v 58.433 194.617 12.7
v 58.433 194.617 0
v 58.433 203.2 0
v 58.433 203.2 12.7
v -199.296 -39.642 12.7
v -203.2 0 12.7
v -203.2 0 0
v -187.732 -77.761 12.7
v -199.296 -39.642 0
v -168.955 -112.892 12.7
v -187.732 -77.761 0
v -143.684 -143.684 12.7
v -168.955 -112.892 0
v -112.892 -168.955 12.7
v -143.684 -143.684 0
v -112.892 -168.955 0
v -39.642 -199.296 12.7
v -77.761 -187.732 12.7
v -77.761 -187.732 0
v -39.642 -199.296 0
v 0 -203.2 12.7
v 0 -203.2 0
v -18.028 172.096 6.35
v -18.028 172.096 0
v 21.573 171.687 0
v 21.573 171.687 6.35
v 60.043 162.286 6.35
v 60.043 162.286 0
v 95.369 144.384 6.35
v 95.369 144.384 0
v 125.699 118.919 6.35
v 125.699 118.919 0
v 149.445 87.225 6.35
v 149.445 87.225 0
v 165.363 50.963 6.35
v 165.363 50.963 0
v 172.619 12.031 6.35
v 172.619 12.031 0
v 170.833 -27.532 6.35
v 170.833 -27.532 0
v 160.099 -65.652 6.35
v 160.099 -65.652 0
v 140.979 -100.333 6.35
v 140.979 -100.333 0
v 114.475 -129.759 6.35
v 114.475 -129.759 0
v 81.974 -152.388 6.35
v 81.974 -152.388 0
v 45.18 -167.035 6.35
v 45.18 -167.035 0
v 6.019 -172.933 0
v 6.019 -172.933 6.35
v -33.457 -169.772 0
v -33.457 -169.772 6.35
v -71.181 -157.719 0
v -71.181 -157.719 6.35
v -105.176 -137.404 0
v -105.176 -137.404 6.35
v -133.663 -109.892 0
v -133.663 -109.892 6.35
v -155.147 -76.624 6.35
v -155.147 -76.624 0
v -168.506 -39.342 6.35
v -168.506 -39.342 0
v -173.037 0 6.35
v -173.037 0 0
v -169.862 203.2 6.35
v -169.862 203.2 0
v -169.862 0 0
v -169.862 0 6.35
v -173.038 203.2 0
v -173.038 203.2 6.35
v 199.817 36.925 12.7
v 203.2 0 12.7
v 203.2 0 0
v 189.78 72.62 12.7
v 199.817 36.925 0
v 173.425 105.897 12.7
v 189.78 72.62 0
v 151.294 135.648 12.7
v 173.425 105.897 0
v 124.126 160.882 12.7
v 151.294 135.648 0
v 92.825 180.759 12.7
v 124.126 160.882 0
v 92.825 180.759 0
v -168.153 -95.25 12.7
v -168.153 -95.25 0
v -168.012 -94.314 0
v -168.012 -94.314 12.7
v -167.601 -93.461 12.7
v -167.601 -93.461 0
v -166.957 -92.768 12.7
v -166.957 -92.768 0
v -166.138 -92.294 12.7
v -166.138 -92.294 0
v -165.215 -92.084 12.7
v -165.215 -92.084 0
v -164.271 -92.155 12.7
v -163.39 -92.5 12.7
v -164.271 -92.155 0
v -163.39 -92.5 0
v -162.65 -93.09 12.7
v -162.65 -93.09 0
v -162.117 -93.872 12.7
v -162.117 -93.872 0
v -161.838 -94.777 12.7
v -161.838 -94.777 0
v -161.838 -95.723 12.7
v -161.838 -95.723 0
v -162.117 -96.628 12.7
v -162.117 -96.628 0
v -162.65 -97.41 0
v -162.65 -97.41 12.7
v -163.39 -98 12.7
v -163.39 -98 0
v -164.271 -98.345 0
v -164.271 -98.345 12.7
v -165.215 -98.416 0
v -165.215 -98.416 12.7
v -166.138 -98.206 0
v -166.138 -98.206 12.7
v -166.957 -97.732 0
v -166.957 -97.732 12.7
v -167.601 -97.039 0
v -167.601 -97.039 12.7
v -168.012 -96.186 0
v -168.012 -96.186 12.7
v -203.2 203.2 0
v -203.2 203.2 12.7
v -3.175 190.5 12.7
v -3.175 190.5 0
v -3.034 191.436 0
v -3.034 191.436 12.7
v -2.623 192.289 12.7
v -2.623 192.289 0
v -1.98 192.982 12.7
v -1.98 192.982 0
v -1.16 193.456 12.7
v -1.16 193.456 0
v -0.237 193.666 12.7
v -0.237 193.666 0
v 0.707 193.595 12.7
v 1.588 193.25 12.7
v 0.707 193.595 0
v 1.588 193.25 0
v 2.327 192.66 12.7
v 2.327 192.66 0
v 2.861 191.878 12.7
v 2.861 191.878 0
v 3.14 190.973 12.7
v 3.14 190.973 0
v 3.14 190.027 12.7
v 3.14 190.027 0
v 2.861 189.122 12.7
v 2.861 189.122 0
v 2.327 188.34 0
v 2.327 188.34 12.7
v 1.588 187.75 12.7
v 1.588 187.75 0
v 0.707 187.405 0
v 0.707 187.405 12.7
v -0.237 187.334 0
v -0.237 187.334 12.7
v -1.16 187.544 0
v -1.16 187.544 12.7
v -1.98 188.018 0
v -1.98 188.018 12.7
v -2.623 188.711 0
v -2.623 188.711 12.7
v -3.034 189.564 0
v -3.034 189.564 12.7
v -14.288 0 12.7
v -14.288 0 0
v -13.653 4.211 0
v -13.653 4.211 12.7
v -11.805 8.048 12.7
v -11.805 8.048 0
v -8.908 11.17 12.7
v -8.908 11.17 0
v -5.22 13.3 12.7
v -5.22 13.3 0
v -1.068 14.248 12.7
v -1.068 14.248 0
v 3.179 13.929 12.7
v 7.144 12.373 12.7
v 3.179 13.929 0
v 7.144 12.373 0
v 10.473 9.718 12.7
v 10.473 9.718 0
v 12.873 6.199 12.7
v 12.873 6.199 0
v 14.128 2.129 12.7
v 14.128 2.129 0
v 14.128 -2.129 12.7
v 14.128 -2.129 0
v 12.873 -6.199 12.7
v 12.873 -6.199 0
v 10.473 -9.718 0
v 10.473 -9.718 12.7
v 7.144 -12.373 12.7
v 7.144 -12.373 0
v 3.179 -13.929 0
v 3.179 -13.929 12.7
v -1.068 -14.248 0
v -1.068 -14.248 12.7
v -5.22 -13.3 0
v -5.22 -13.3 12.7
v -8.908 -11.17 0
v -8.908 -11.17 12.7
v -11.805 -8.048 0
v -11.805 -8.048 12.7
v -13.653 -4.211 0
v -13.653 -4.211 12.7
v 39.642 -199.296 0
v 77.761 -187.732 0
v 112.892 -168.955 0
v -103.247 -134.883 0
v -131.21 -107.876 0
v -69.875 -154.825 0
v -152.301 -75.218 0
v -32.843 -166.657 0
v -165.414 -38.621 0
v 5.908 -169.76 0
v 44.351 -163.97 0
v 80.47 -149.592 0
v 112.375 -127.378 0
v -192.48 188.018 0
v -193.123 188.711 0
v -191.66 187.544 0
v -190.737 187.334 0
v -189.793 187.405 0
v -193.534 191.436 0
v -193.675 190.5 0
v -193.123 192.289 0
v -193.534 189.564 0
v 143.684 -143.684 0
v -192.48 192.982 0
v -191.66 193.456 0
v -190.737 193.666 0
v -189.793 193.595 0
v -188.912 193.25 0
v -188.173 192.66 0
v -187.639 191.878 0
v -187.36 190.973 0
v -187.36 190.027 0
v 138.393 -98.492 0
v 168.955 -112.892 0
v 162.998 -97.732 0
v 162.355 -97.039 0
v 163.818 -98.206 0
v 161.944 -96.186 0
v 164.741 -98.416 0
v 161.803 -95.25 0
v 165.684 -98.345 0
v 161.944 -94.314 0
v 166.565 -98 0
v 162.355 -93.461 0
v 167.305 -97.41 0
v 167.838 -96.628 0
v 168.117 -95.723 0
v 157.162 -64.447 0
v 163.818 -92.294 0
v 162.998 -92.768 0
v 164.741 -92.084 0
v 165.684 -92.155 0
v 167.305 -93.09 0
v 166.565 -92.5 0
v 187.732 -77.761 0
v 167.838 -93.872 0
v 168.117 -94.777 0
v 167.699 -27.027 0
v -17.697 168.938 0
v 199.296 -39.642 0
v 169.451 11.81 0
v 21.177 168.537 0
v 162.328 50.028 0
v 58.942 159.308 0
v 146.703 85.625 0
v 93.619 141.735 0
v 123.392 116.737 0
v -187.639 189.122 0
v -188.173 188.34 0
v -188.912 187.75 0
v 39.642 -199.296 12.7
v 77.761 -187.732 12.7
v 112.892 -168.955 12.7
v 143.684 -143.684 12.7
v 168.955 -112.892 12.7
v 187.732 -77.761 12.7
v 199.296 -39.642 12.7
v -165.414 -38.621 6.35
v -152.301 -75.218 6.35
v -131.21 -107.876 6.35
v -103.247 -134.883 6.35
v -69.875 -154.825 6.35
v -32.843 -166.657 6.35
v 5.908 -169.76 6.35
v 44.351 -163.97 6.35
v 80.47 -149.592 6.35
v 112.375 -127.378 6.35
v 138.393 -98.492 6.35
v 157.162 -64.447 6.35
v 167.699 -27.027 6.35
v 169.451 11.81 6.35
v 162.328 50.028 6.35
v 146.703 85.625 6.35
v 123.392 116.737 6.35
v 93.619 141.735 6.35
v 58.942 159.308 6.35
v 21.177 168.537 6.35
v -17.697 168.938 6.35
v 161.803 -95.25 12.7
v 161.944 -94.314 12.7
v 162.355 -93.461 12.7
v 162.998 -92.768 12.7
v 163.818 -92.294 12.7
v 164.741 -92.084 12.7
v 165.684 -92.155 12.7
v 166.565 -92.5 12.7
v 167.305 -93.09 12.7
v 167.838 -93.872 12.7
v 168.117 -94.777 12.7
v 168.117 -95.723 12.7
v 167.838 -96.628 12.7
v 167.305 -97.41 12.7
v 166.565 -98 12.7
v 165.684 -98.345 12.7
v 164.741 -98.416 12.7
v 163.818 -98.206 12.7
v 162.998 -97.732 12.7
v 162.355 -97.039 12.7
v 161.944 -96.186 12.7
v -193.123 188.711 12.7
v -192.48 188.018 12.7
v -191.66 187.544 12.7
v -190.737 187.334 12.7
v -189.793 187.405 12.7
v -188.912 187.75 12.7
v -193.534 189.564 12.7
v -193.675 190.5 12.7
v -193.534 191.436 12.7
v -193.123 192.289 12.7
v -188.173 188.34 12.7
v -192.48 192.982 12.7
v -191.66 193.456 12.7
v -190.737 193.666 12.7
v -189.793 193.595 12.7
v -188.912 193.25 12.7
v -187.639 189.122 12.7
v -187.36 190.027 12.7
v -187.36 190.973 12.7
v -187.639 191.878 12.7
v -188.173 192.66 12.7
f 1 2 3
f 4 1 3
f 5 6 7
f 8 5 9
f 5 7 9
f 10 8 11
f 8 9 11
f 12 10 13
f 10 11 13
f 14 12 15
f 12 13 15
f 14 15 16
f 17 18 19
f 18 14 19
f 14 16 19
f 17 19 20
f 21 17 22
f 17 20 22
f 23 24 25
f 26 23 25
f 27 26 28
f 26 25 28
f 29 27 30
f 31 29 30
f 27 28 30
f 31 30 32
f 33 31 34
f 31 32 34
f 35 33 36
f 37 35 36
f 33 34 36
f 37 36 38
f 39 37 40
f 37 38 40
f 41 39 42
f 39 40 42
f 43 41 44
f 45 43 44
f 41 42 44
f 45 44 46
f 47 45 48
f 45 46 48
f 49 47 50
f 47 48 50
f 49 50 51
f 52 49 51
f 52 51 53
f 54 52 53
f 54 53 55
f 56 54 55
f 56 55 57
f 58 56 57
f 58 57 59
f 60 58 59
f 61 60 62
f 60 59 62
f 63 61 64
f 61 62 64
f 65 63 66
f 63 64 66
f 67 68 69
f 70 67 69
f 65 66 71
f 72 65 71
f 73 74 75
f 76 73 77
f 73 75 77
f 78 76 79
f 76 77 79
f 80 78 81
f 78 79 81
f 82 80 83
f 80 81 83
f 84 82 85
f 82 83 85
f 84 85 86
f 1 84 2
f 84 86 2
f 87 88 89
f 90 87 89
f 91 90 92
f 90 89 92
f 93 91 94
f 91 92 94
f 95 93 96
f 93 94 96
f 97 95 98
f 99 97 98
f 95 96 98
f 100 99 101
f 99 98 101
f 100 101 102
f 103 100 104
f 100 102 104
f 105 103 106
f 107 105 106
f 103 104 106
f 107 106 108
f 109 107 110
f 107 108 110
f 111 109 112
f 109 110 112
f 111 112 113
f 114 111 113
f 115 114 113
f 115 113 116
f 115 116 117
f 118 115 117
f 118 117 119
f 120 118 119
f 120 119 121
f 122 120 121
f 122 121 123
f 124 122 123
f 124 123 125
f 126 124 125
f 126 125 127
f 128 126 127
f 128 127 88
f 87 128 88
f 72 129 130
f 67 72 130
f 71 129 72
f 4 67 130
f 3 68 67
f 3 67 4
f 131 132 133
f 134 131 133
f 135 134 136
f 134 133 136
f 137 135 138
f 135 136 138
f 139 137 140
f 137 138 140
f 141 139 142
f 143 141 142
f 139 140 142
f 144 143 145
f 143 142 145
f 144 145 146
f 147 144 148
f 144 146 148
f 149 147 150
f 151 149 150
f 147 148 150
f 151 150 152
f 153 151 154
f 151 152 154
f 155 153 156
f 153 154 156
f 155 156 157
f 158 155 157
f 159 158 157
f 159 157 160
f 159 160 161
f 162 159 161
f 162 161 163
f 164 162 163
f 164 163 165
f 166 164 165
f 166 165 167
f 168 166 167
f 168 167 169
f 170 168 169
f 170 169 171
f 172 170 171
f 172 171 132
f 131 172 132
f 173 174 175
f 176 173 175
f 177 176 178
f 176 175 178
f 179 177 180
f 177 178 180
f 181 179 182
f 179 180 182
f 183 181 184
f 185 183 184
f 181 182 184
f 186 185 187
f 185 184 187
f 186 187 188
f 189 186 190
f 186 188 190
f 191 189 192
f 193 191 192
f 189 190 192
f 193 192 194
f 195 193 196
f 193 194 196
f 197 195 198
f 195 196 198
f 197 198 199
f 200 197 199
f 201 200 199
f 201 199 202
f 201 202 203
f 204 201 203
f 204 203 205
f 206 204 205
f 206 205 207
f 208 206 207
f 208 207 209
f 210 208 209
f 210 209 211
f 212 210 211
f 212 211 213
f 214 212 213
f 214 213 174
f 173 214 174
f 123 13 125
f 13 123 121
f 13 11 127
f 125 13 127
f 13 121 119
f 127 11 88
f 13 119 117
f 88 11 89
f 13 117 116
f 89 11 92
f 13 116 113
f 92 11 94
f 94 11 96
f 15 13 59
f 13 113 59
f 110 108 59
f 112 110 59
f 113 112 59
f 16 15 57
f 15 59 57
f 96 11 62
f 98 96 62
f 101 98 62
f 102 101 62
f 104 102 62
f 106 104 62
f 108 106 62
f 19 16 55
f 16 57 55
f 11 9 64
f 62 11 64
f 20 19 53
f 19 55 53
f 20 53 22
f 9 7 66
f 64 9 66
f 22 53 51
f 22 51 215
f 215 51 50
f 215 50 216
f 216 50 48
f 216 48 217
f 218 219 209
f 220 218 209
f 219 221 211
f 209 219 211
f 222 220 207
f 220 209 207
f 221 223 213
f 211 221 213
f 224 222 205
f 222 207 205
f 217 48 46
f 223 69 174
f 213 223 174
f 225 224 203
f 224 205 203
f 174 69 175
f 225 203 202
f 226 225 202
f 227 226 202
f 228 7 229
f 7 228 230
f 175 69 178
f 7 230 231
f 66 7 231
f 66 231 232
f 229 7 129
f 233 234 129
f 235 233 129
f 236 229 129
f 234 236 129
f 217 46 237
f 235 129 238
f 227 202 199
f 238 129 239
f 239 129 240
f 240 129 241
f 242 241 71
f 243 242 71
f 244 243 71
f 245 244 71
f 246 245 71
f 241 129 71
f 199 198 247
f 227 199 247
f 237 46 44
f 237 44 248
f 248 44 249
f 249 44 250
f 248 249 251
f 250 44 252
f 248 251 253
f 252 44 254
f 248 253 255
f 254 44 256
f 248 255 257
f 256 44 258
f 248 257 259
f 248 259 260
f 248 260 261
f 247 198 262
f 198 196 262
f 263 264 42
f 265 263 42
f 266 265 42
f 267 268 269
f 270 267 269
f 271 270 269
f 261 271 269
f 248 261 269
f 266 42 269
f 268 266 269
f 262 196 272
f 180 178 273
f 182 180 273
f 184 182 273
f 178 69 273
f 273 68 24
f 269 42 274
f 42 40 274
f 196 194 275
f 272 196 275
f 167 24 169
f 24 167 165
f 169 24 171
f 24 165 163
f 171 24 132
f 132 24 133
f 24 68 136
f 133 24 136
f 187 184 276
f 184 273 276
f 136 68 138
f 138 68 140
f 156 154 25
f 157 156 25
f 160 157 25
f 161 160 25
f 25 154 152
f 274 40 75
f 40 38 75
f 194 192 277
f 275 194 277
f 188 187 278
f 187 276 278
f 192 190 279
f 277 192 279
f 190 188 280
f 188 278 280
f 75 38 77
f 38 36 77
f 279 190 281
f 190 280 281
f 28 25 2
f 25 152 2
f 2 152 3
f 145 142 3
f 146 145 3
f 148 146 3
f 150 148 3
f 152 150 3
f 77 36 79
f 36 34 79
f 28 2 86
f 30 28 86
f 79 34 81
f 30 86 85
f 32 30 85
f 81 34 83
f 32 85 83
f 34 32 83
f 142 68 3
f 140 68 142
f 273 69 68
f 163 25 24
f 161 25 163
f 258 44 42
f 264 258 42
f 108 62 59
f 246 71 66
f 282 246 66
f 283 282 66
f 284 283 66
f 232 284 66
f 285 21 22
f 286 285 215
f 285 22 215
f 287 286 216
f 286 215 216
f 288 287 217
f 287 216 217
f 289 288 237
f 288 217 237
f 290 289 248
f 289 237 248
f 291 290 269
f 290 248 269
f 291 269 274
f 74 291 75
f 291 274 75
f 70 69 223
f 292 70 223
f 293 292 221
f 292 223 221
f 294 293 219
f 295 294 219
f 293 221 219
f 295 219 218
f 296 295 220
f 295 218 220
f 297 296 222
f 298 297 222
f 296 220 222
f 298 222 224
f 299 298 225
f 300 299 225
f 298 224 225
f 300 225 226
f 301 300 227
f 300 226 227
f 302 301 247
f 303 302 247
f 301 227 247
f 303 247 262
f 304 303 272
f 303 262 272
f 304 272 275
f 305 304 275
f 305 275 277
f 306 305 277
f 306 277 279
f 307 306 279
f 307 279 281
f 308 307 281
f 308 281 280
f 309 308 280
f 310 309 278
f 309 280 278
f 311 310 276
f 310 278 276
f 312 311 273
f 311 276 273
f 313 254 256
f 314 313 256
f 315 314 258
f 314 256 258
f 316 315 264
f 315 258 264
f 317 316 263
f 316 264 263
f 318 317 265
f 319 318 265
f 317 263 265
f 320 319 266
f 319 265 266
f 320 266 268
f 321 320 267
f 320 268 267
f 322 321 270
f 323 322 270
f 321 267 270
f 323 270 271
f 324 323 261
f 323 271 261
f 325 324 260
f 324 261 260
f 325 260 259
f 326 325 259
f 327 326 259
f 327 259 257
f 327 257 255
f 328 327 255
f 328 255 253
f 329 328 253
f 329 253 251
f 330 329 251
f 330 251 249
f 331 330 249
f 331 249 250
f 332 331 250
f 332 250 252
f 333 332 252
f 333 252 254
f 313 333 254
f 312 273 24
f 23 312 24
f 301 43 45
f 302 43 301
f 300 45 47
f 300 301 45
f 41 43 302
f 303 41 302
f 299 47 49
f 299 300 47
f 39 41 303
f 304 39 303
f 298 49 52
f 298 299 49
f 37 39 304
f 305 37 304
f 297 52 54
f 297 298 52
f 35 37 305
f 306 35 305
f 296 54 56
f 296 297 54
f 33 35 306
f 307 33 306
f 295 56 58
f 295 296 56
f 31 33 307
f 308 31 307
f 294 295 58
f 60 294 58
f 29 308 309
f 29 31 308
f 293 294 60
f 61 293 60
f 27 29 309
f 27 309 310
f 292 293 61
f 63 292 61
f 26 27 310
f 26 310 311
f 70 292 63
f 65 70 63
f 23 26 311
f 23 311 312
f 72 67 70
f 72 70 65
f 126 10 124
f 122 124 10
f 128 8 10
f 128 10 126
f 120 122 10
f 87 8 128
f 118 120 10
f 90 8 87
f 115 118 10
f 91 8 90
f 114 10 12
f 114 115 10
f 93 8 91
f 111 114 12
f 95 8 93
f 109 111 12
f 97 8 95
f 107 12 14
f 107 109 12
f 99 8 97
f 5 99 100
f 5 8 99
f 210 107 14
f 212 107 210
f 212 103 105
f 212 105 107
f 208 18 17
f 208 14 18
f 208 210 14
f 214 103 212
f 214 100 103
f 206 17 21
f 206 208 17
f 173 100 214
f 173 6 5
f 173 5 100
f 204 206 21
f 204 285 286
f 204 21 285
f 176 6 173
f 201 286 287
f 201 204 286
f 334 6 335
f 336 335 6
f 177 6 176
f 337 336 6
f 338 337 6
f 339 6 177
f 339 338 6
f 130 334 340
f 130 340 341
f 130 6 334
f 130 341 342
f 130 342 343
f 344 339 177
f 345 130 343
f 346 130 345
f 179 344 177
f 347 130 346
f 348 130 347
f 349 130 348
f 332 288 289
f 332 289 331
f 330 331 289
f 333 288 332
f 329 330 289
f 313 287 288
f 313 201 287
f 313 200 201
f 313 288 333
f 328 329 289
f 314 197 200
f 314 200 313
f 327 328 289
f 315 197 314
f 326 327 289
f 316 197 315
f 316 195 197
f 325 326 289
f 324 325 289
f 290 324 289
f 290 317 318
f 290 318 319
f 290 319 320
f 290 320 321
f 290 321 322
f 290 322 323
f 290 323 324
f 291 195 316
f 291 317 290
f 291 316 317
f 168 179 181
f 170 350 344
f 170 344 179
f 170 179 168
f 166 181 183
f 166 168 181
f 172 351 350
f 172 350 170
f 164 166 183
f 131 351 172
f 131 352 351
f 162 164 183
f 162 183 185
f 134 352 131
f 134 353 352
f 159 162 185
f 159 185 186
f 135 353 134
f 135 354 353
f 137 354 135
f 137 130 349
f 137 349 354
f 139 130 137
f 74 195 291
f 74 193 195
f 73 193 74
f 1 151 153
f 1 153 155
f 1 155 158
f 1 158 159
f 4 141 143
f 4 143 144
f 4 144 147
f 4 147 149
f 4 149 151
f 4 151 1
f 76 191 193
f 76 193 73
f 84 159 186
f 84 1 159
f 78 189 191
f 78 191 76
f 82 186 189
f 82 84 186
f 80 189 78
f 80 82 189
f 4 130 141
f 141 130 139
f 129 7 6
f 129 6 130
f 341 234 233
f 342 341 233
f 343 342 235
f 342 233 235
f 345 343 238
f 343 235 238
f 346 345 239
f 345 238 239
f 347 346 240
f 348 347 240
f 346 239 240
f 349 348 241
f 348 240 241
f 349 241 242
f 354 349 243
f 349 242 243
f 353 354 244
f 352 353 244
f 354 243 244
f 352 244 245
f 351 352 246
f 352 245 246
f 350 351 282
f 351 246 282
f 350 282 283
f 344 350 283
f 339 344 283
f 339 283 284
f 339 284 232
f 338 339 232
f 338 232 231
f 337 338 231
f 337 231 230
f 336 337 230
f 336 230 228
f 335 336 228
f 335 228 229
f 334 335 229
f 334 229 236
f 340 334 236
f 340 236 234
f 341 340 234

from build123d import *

# Parameters (mm, degrees)
SKETCH1_W           = 406.4
SKETCH1_H           = 406.4
BOSS_EXTRUDE1_DEPTH = 12.7
CUT_EXTRUDE1_DEPTH  = 6.35
SKETCH3_R           = 14.2875
CUT_EXTRUDE2_DEPTH  = 13.7
SKETCH4_R           = 3.175
CUT_EXTRUDE3_DEPTH  = 13.7


with BuildPart() as part:
    # Sketch1 → Boss-Extrude1 (new body)
    with BuildSketch(Plane.XY):
        Rectangle(SKETCH1_W, SKETCH1_H)
    extrude(amount=BOSS_EXTRUDE1_DEPTH)

    # Sketch2 → Cut-Extrude1 (cut)
    with BuildSketch(Plane(origin=(0, 0, 0), x_dir=(-1, 0, 0), z_dir=(0, 0, -1))):
        with BuildLine():
            Line((17.696900373, 168.938120694), (18.027683557, 172.095842576))
            ThreePointArc((18.027683557, 172.095842576), (-128.571850923, -115.806975422), (173.0375, 0))
            Line((173.0375, 0), (173.0375, 203.2))
            Line((173.0375, 203.2), (169.8625, 203.2))
            Line((169.8625, 203.2), (169.8625, 0))
            ThreePointArc((169.8625, 0), (-126.212734393, -113.68207679), (17.696900373, 168.938120694))
        make_face()
    extrude(amount=-CUT_EXTRUDE1_DEPTH, mode=Mode.SUBTRACT)

    # Sketch3 → Cut-Extrude2 (cut, through all)
    with BuildSketch(Plane(origin=(0, 0, 0), x_dir=(-1, 0, 0), z_dir=(0, 0, -1))):
        with BuildLine():
            ThreePointArc((203.2, 0), (143.684097941, -143.684097933), (1.1e-08, -203.2))
            Line((1.1e-08, -203.2), (203.2, -203.2))
            Line((203.2, -203.2), (203.2, 0))
        make_face()
        with BuildLine():
            ThreePointArc((1.1e-08, -203.2), (-143.684098268, -143.684097606), (-203.2, 9.47e-07))
            Line((-203.2, 9.47e-07), (-203.2, -203.2))
            Line((-203.2, -203.2), (1.1e-08, -203.2))
        make_face()
        with BuildLine():
            ThreePointArc((-203.2, 9.47e-07), (-163.039512773, 121.278016454), (-58.432704894, 194.617211466))
            Line((-58.432704894, 194.617211466), (-58.432704894, 203.2))
            Line((-58.432704894, 203.2), (-203.2, 203.2))
            Line((-203.2, 203.2), (-203.2, 9.47e-07))
        make_face()
        Circle(SKETCH3_R)
    extrude(amount=-CUT_EXTRUDE2_DEPTH, mode=Mode.SUBTRACT)

    # Sketch4 → Cut-Extrude3 (cut, through all)
    with BuildSketch(Plane(origin=(0, 0, 0), x_dir=(-1, 0, 0), z_dir=(0, 0, -1))):
        with Locations((-164.977839421, -95.25)):
            Circle(SKETCH4_R)
        with Locations((0, 190.5)):
            Circle(SKETCH4_R)
        with Locations((164.977839421, -95.25)):
            Circle(SKETCH4_R)
        with Locations((190.5, 190.5)):
            Circle(SKETCH4_R)
    extrude(amount=-CUT_EXTRUDE3_DEPTH, mode=Mode.SUBTRACT)


solid = part.part
